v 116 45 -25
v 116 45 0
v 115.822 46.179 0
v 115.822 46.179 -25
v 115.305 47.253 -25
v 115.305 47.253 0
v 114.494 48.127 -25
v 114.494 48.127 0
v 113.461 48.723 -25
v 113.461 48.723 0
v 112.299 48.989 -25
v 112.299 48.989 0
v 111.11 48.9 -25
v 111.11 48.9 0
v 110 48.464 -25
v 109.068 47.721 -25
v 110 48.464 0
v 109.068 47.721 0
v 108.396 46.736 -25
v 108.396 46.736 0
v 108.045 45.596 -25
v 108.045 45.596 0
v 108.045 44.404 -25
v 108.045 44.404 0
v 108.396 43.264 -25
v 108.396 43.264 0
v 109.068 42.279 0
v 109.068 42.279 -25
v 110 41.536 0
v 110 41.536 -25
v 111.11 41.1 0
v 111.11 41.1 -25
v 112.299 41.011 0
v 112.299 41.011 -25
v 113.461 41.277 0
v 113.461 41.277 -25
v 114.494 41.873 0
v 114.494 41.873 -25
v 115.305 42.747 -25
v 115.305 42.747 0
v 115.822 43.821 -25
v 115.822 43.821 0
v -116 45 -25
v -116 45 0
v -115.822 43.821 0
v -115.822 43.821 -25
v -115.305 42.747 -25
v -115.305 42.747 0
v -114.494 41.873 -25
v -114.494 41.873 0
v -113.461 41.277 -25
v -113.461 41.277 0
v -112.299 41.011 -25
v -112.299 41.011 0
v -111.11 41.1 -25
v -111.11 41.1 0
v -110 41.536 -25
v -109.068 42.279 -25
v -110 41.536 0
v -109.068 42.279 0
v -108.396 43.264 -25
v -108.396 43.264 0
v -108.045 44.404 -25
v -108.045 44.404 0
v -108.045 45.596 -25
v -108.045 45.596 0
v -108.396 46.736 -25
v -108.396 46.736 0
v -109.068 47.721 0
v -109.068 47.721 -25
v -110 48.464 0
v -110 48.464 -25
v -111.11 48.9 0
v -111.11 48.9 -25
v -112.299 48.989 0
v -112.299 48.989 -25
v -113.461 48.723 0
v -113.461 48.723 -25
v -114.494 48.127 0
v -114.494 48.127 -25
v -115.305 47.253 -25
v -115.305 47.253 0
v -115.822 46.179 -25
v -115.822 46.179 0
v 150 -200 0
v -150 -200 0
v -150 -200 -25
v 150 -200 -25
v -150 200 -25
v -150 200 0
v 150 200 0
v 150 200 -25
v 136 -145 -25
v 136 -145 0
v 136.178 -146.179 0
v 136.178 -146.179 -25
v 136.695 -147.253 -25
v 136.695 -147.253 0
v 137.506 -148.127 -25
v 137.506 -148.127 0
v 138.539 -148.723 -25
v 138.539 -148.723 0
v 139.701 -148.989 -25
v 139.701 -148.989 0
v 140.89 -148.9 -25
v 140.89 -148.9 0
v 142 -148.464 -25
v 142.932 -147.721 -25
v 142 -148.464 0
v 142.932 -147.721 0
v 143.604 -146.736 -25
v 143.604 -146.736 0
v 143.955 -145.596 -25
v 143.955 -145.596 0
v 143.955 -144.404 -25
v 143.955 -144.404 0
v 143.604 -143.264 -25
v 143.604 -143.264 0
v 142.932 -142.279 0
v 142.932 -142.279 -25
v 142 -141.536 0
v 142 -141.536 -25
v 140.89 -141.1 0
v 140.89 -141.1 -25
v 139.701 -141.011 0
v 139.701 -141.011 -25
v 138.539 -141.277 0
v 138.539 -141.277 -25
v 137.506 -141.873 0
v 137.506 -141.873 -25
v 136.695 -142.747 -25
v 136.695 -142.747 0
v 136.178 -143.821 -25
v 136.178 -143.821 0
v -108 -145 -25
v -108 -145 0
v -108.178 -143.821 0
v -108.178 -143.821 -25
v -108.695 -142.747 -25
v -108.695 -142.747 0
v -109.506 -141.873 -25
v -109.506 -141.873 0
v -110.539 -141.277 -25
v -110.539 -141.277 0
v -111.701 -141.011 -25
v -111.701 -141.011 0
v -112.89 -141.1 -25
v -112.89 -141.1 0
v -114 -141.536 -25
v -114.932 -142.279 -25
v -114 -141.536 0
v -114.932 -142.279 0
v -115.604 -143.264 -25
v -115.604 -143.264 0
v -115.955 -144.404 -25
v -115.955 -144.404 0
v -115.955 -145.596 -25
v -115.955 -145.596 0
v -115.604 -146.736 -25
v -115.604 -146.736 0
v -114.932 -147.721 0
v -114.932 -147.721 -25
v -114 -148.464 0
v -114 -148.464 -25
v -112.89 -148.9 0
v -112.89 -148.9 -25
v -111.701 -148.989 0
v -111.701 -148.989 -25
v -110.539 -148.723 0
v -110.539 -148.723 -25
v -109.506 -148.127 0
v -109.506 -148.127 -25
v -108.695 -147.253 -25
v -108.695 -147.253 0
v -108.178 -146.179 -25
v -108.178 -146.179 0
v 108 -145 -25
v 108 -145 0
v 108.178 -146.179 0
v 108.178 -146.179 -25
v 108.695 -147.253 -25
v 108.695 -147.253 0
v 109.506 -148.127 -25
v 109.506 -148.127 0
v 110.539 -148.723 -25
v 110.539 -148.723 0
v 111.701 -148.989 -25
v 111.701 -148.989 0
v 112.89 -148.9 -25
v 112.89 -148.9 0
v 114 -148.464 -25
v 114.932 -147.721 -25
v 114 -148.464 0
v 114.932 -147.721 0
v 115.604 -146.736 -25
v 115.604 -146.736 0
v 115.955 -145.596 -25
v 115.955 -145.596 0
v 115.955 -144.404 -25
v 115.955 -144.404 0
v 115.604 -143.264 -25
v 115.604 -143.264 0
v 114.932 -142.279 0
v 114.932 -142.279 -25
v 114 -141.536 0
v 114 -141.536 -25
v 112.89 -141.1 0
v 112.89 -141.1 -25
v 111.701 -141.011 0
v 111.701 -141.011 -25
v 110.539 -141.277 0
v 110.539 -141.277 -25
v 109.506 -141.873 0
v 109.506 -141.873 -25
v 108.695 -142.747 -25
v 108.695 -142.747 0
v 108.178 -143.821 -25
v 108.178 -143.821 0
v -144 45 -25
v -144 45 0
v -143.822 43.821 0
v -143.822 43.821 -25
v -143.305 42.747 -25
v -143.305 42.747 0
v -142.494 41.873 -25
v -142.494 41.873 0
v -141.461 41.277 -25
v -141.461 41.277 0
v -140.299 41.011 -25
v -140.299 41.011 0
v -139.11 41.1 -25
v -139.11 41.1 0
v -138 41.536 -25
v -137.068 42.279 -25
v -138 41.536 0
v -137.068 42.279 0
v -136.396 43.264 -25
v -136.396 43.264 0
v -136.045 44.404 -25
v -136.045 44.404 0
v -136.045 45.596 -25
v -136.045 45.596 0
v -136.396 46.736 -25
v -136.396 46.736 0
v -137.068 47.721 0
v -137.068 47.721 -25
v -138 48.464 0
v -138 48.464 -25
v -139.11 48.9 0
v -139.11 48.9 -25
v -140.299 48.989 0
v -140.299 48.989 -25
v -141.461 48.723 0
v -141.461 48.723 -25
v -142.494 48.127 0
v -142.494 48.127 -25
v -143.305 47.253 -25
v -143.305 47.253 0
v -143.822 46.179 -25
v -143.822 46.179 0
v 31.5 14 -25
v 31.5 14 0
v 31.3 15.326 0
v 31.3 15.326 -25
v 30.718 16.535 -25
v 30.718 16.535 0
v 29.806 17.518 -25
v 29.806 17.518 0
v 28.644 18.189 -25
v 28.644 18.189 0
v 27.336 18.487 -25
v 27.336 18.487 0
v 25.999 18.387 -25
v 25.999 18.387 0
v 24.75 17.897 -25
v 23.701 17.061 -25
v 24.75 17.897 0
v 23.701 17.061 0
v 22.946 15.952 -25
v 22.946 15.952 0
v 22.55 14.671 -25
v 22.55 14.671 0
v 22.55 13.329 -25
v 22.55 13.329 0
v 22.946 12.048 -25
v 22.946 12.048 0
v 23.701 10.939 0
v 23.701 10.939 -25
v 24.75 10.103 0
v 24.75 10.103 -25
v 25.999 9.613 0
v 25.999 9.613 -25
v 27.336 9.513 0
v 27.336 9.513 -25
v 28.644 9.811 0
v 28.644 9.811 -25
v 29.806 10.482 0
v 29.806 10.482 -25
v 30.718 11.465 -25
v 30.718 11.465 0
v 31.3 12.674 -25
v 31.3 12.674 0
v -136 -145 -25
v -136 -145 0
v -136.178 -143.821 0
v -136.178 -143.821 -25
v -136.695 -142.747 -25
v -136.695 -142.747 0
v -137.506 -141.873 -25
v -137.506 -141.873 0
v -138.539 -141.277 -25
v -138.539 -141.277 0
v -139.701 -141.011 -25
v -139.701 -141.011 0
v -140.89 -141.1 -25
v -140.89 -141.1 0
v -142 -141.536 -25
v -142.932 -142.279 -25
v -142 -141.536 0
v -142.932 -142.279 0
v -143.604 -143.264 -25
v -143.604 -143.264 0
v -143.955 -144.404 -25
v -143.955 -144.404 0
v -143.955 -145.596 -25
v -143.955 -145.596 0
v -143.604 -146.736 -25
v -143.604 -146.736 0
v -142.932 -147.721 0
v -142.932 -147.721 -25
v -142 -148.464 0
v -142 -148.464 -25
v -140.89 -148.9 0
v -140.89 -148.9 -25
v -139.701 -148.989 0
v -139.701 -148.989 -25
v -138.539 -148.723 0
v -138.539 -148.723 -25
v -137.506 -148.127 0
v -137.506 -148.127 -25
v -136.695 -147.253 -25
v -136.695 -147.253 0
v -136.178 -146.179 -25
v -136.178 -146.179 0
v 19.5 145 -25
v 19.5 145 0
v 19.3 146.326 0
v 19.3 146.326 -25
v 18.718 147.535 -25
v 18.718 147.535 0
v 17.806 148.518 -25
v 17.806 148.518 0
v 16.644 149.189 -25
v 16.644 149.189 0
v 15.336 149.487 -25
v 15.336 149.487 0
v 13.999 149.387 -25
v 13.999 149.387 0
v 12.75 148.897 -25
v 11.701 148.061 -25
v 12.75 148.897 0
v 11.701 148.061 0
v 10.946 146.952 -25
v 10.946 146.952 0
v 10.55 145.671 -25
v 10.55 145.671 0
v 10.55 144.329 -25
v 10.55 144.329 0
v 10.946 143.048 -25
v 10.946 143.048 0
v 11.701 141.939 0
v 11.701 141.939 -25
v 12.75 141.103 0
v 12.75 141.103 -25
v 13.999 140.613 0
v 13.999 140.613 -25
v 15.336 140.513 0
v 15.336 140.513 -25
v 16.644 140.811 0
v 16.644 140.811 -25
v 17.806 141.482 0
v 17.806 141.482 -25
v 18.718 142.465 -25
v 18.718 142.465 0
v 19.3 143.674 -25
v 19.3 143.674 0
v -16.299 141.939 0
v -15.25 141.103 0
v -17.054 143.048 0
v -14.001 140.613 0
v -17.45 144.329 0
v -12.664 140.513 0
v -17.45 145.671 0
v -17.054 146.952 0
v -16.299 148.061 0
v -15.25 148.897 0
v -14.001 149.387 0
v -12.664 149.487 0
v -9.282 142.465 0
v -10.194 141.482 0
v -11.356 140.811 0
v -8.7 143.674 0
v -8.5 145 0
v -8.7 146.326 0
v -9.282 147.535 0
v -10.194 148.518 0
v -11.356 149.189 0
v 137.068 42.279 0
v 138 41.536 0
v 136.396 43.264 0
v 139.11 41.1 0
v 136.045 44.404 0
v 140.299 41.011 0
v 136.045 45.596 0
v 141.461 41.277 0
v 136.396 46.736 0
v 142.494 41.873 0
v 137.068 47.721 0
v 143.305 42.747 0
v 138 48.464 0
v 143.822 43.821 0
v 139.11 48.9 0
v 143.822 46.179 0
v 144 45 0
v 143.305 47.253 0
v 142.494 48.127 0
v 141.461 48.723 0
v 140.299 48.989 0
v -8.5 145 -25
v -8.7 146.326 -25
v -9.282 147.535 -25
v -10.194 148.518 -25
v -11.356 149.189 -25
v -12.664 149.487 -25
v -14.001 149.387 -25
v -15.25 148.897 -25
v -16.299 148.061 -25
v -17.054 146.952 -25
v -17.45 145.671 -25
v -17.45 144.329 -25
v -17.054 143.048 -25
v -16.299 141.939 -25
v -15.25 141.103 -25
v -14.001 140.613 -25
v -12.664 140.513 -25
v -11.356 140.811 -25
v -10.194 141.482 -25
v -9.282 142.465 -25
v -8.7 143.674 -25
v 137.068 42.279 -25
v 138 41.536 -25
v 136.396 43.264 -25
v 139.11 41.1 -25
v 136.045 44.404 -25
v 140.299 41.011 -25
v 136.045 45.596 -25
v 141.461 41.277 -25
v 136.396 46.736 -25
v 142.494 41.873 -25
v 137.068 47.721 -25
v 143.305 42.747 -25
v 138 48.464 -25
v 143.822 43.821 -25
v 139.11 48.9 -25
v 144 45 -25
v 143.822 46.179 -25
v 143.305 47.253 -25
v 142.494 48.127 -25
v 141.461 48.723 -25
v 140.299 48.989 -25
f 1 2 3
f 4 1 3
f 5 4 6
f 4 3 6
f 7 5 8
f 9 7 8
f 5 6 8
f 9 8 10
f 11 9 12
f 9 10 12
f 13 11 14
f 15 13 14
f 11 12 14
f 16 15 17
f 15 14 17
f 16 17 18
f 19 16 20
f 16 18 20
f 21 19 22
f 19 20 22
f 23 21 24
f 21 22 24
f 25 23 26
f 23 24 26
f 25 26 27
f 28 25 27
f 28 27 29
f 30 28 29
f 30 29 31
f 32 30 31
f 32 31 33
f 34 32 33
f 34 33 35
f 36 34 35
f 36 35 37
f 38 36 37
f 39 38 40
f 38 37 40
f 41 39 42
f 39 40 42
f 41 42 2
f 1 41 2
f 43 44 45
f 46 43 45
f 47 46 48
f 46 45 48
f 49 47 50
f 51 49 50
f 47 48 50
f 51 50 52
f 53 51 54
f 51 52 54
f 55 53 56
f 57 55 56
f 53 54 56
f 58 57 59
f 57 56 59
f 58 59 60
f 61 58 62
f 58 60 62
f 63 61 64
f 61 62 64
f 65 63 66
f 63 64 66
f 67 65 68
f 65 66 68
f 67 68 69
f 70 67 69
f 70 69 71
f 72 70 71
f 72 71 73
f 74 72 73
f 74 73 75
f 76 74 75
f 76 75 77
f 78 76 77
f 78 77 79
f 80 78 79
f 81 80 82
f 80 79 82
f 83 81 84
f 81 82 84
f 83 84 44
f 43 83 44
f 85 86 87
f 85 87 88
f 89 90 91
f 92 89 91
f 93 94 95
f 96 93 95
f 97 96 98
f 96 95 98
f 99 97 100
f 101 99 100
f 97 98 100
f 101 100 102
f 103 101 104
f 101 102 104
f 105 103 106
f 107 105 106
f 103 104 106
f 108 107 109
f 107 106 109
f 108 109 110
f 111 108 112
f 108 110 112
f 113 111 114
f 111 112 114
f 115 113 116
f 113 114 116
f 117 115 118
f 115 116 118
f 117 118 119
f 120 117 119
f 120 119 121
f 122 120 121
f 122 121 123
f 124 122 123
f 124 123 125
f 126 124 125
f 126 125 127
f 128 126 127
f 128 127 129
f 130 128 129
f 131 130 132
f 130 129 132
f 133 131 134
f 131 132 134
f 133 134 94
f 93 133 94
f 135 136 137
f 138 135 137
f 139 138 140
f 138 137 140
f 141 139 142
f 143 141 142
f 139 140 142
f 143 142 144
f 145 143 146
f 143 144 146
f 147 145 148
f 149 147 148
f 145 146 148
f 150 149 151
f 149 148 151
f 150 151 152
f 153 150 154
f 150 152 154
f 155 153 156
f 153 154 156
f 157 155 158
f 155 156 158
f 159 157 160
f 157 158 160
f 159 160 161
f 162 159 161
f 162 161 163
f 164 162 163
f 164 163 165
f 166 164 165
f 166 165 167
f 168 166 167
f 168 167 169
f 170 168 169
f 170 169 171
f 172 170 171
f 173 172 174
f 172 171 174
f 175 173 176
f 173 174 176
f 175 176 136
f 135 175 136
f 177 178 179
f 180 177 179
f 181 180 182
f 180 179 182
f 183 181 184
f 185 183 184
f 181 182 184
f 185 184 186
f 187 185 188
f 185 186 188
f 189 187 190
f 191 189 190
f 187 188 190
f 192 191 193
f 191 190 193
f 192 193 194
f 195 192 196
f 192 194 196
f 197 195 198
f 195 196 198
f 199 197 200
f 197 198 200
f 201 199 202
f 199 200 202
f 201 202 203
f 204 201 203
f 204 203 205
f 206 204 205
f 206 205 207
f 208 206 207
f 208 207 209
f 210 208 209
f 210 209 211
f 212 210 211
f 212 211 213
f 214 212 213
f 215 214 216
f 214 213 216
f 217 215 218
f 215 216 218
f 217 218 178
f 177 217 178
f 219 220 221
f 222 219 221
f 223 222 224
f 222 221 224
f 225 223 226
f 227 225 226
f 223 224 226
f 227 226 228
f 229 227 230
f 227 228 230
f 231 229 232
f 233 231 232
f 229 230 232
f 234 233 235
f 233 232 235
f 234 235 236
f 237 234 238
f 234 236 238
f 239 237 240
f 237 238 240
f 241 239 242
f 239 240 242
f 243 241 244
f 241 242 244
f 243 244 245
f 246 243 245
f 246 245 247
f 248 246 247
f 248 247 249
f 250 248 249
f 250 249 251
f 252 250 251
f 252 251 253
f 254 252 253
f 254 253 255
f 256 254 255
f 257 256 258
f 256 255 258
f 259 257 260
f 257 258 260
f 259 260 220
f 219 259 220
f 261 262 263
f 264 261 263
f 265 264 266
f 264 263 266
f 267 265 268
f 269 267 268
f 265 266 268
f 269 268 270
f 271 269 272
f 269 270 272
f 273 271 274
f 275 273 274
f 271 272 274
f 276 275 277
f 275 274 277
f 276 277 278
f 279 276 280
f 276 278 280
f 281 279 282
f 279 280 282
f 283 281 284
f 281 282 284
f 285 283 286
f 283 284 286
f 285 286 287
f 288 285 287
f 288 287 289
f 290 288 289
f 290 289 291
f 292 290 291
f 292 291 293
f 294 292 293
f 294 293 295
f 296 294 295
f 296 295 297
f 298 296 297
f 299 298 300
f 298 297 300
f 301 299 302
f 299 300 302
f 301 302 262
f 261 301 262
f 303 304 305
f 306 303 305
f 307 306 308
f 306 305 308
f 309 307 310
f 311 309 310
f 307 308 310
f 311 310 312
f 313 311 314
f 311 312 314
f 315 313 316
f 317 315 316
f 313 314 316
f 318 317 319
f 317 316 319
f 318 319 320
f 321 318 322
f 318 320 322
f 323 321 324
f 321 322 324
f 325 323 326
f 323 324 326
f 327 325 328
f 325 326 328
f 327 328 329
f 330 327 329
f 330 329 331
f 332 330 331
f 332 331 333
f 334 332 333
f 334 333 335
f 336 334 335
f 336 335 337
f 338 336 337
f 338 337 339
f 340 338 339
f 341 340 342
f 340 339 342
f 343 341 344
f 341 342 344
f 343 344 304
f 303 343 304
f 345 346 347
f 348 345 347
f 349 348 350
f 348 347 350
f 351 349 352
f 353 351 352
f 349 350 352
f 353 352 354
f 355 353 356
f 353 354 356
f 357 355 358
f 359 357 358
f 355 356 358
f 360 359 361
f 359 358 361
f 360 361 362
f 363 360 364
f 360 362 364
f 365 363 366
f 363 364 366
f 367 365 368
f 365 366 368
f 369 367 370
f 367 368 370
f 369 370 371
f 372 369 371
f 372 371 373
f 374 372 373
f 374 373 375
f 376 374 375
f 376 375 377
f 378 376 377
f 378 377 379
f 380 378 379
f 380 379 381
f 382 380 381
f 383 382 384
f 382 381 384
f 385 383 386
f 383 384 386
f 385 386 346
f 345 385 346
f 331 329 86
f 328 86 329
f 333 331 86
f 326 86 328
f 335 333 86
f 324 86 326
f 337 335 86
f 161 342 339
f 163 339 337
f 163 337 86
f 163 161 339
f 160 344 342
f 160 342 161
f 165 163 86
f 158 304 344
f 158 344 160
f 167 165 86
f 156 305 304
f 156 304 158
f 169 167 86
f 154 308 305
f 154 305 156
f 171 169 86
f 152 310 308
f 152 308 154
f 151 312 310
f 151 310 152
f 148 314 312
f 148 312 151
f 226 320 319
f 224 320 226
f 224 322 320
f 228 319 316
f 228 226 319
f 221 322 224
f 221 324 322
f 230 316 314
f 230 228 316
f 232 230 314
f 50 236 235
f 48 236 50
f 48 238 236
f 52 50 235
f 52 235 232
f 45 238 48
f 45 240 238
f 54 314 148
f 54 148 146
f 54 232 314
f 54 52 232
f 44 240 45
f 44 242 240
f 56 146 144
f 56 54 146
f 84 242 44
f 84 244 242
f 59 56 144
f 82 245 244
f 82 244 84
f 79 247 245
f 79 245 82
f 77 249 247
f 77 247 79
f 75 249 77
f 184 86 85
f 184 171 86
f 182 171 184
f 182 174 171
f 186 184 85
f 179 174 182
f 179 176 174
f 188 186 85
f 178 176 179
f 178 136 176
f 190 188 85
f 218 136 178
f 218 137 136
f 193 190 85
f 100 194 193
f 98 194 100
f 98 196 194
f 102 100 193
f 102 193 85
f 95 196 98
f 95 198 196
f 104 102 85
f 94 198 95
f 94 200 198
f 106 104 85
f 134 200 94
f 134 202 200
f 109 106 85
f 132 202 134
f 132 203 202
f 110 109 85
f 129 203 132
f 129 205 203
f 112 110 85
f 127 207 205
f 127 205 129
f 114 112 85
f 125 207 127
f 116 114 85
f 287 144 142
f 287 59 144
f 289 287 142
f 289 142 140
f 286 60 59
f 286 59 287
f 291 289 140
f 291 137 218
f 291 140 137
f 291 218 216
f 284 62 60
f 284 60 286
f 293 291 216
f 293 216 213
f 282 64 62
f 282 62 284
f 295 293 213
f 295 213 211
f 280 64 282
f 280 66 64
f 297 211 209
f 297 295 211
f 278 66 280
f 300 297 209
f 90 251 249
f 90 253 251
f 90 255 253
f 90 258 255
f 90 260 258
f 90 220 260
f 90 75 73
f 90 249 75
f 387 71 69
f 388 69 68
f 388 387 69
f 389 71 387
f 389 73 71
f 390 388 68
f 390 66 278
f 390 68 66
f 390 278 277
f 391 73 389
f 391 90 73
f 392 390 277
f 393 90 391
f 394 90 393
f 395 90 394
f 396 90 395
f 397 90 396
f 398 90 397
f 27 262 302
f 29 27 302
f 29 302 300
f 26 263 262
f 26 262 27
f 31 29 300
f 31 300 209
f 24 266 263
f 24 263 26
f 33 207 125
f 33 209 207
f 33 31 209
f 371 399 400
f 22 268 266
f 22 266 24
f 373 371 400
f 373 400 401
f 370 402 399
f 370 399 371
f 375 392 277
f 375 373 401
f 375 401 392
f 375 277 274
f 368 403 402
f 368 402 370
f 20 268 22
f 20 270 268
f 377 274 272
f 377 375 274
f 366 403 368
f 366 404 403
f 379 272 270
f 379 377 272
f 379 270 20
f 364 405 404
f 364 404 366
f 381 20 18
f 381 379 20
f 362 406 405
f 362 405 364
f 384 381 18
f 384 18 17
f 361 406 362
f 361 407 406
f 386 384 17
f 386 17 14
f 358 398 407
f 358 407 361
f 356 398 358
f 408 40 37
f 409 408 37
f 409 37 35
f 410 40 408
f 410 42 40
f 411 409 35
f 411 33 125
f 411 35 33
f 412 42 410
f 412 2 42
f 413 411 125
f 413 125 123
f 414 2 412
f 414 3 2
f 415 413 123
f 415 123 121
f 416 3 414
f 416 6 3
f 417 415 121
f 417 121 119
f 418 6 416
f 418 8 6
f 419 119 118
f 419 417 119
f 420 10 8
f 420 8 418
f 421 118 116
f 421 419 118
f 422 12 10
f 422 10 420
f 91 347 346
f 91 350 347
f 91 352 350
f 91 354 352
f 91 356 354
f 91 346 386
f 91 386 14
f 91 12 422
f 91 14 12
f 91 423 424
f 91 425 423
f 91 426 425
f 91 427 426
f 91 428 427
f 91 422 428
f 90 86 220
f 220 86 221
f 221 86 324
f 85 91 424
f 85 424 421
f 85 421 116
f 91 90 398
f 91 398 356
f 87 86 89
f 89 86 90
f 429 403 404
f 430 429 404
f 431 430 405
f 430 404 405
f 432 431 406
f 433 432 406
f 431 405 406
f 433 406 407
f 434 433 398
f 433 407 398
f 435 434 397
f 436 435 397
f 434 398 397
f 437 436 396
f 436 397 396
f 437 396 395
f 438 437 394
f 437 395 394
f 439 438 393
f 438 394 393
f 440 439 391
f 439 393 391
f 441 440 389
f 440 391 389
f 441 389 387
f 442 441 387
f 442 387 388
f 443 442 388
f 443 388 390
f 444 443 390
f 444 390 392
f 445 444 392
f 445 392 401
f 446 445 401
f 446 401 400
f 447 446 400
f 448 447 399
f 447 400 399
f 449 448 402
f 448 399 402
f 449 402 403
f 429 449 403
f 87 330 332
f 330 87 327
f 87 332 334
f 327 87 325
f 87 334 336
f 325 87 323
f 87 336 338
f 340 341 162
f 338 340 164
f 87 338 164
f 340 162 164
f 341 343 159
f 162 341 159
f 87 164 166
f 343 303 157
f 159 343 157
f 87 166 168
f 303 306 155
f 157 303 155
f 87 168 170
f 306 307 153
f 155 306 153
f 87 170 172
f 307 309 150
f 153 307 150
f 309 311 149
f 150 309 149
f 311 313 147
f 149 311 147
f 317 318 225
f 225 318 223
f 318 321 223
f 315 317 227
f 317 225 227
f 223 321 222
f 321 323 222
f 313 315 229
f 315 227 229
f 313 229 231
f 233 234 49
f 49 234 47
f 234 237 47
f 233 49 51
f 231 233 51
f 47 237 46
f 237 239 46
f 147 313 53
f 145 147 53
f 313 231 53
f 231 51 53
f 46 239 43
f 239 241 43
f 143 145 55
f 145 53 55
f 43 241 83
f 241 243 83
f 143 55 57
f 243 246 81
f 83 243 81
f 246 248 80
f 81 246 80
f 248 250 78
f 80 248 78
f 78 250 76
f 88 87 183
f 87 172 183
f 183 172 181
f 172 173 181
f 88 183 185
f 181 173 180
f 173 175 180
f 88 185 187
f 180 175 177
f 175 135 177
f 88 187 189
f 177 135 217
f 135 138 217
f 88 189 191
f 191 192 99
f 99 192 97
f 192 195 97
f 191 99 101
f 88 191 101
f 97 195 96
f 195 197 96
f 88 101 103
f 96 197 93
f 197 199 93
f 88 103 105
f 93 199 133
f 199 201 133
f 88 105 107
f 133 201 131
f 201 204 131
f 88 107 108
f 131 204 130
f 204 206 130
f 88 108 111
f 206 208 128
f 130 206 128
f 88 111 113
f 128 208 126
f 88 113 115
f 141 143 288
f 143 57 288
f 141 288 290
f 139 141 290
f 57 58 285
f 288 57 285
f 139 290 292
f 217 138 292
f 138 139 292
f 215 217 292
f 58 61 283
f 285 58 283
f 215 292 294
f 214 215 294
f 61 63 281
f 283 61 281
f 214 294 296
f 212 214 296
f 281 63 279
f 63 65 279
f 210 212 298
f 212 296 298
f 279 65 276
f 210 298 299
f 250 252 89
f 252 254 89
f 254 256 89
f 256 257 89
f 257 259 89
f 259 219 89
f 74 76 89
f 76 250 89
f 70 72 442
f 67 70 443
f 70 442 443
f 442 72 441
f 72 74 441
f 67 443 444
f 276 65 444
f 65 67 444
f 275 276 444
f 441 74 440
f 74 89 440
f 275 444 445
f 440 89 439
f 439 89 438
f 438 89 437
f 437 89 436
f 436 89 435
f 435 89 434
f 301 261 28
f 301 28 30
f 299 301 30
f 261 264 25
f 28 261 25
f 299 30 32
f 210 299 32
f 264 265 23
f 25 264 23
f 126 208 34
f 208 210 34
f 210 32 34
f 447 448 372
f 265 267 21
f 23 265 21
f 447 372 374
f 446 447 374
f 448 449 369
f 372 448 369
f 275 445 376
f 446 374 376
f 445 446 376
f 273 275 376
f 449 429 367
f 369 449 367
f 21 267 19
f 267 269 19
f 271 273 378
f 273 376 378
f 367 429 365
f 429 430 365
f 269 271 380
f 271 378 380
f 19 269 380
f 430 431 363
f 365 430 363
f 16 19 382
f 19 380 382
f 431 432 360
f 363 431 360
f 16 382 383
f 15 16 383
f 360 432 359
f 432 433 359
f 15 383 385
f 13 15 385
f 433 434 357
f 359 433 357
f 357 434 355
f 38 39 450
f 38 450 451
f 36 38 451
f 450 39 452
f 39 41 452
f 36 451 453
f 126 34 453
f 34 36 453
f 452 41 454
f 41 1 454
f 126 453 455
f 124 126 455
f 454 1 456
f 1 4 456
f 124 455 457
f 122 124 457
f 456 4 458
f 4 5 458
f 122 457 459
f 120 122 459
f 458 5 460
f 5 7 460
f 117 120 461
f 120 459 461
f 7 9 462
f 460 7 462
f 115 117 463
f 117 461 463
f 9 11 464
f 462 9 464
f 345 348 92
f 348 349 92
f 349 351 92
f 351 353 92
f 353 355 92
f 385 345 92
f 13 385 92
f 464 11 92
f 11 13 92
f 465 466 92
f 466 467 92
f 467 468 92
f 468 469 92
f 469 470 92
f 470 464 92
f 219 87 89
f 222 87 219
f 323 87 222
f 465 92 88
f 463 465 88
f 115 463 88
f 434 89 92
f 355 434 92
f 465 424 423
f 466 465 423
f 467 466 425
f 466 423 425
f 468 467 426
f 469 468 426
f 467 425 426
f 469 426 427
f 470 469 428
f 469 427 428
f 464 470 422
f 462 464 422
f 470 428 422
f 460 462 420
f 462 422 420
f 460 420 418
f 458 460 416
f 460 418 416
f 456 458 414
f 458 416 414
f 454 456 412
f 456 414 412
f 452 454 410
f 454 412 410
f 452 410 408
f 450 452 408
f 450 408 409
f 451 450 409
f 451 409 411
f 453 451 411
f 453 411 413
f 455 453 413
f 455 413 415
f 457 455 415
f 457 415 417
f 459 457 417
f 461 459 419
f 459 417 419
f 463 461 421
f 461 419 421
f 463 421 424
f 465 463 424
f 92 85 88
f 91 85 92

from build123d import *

# Parameters (mm, degrees)
SKETCH1_W           = 300
SKETCH1_H           = 400
SKETCH1_R           = 4
SKETCH1_R_2         = 4.5
BOSS_EXTRUDE1_DEPTH = 25


with BuildPart() as part:
    # Sketch1 → Boss-Extrude1 (new body)
    with BuildSketch(Plane.XY):
        Rectangle(SKETCH1_W, SKETCH1_H)
        with Locations((-112, -145)):
            Circle(SKETCH1_R, mode=Mode.SUBTRACT)
        with Locations((-140, -145)):
            Circle(SKETCH1_R, mode=Mode.SUBTRACT)
        with Locations(Location((112, -145, 0), (0, 0, 180))):
            Circle(SKETCH1_R, mode=Mode.SUBTRACT)
        with Locations(Location((140, -145, 0), (0, 0, 180))):
            Circle(SKETCH1_R, mode=Mode.SUBTRACT)
        with Locations((15, 145)):
            Circle(SKETCH1_R_2, mode=Mode.SUBTRACT)
        with Locations((-13, 145)):
            Circle(SKETCH1_R_2, mode=Mode.SUBTRACT)
        with Locations((27, 14)):
            Circle(SKETCH1_R_2, mode=Mode.SUBTRACT)
        with Locations((140, 45)):
            Circle(SKETCH1_R, mode=Mode.SUBTRACT)
        with Locations((112, 45)):
            Circle(SKETCH1_R, mode=Mode.SUBTRACT)
        with Locations(Location((-112, 45, 0), (0, 0, 180))):
            Circle(SKETCH1_R, mode=Mode.SUBTRACT)
        with Locations(Location((-140, 45, 0), (0, 0, 180))):
            Circle(SKETCH1_R, mode=Mode.SUBTRACT)
    extrude(amount=-BOSS_EXTRUDE1_DEPTH)


solid = part.part
